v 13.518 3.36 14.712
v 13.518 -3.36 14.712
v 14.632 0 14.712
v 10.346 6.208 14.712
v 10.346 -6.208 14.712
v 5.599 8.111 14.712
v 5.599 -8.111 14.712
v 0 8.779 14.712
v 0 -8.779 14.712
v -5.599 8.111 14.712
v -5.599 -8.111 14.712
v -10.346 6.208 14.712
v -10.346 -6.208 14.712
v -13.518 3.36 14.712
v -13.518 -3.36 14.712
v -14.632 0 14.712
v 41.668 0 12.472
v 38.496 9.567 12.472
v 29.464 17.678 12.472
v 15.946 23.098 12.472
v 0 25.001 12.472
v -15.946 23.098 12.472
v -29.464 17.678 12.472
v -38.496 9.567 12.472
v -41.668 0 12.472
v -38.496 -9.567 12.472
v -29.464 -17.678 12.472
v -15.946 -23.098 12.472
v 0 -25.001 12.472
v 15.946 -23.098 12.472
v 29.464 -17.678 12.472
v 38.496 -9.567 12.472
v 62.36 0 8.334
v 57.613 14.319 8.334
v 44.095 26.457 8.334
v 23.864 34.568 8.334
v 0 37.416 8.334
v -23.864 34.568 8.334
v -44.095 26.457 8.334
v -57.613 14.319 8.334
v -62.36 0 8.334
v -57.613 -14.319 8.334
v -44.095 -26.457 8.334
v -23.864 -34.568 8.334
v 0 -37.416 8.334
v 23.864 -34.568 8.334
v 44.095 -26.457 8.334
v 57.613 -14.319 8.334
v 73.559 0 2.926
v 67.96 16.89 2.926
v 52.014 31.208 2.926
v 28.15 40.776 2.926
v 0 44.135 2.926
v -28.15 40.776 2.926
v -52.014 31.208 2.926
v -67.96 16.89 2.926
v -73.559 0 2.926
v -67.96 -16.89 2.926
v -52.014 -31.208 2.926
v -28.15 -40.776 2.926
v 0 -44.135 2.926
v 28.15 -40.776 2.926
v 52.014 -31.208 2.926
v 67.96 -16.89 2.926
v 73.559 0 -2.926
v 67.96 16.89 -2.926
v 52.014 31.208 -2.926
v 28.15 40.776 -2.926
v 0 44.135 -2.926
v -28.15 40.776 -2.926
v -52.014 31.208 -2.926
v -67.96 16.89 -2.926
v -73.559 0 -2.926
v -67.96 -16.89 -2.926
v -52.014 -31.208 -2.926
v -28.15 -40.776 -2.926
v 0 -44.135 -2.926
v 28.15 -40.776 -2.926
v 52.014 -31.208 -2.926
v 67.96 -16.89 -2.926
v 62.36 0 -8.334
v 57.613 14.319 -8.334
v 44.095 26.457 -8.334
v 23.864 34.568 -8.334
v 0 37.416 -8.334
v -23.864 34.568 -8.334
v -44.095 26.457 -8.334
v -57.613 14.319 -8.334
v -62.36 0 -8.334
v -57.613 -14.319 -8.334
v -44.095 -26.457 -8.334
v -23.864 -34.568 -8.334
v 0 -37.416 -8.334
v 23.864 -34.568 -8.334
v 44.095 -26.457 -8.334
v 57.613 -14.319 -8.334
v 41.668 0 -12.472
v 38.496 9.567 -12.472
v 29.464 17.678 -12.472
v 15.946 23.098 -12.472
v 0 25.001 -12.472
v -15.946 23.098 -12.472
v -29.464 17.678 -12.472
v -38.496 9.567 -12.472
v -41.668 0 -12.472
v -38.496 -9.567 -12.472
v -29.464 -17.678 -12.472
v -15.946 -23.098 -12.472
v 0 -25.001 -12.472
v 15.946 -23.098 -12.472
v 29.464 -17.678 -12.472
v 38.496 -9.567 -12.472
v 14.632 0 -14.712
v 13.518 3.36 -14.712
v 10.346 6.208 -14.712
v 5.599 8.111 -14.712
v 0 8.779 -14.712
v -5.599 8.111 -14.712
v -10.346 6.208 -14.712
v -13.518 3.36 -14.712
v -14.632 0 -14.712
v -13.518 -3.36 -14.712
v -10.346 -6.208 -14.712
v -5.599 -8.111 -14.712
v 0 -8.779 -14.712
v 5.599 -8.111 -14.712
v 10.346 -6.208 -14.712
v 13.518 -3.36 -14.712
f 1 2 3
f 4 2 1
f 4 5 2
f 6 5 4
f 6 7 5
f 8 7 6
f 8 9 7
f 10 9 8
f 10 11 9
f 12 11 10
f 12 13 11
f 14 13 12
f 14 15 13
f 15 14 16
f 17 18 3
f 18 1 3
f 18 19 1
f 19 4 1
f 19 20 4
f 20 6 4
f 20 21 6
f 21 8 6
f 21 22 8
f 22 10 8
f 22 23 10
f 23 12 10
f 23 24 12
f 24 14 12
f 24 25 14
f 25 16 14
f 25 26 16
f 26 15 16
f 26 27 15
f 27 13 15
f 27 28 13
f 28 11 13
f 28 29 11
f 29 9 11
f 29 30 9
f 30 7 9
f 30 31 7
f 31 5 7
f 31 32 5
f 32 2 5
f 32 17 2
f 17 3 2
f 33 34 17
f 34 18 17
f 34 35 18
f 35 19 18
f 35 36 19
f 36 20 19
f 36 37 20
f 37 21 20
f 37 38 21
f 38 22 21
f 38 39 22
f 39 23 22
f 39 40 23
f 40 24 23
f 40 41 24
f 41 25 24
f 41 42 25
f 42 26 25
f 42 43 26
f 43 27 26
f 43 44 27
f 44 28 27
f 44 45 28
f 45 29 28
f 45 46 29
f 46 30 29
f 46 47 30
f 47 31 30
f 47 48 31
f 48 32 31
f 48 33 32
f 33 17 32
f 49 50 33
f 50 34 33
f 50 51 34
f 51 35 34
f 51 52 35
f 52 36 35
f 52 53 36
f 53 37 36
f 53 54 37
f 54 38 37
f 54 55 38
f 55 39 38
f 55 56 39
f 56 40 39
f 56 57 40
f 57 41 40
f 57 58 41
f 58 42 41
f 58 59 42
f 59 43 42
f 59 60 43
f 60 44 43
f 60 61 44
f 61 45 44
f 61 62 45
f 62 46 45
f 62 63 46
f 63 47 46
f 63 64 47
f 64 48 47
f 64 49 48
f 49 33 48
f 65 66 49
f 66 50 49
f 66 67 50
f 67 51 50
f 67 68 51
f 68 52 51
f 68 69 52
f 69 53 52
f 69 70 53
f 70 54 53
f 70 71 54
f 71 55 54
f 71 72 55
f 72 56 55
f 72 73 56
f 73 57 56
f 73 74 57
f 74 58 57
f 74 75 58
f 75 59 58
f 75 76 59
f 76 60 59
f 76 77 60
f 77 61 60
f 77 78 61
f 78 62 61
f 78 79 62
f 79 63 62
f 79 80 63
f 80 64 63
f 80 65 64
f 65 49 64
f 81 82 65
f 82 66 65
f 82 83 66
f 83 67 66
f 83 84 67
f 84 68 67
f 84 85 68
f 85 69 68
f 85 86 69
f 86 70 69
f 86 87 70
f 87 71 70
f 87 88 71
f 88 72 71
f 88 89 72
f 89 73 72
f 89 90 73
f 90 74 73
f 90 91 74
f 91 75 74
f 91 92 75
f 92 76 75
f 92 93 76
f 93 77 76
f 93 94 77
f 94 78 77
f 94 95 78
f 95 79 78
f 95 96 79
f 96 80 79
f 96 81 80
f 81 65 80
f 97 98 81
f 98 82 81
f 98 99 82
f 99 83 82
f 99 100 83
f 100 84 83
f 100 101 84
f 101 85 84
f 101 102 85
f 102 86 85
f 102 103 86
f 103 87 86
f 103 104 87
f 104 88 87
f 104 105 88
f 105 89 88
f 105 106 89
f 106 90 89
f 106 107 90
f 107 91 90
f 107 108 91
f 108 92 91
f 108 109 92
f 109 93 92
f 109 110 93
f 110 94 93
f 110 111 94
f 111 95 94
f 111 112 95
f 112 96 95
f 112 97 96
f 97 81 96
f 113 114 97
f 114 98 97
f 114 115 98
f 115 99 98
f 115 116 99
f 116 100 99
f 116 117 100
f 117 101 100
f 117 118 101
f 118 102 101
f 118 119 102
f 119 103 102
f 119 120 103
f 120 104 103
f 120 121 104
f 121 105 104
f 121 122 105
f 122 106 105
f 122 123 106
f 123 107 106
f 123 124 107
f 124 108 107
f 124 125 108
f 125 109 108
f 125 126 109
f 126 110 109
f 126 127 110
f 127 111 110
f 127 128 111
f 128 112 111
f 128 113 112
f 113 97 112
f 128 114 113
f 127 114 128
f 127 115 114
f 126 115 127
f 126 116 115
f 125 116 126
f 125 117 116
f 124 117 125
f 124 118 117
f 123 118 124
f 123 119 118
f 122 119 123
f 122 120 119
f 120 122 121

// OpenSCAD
// Generated by SolidPython 1.0.1 on 2020-07-29 00:46:51


scale(v = [15, 9, 3]) {
	sphere(r = 5);
}
/***********************************************
*********      SolidPython code:      **********
************************************************
 
# import packages: SolidPython
from solid import *
from solid.utils import *
from itertools import chain, combinations, permutations


class Resize:

    def __init__(self, scad_file):
        self.scad_file = scad_file
        #self.scad_file = import_scad(scad_file)
        # cone/cylinder param:
        self.r1 = 0
        self.r2 = 0
        self.h = 0
        # rectangular prism param:
        self.w = 0
        self.l = 0
        # ellipse param:
        self.r = 0

    # import OpenScad code (file name corresponds to shape)


    # classify shape + parameters
    def assign(self, param1, param2, param3):
        if self.scad_file == 'cone.scad':
            self.r1 = param1
            self.r2 = param2
            self.h = param3
        elif self.scad_file == 'cylinder.scad':
            self.r1 = param1
            self.r2 = param2
            self.h = param3
        elif self.scad_file == 'rectangularPrism.scad':
            self.h = param1
            self.l = param2
            self.w = param3
        else:
            self.r = param1
            self.h = param2

    # resize parameters
    def iterate(self):
        x = range(3, 20, 2)
        i = 1
        if self.scad_file == 'cone.scad':
            tempList = list(permutations(x, 2))
            for temp in tempList:
                param1 = temp[0]
                param2 = temp[1]
                filepath = 'produced_scad_files/' + 'cone' + str(param1) + '_' + str(param2) + '_' + '.scad'
                scad_render_to_file(cylinder(h=param1, r1=param2, r2=0), filepath)

        elif self.scad_file == 'cylinder.scad':
            tempList = list(permutations(x, 3))
            for temp in tempList:
                param1 = temp[0]
                param2 = temp[1]
                filepath = 'produced_scad_files/' + 'cylinder' + str(param1) + '_' + str(param2) + '_' + '.scad'
                scad_render_to_file(cylinder(h=param1, r1=param2, r2=param2), filepath)

        elif self.scad_file == 'rectangularPrism.scad':
            tempList = list(permutations(x, 3))
            for temp in tempList:
                param1 = temp[0]
                param2 = temp[1]
                param3 = temp[2]
                filepath = 'produced_scad_files/' + 'rectangularPrism' + str(param1) + '_' + str(param2) + '_' + str(
                    param3) + '.scad'
                scad_render_to_file(cube(size=(param1, param2, param3)), filepath)

        elif self.scad_file == 'ellipse.scad':
            tempList = list(permutations(x, 4))
            for temp in tempList:
                param1 = temp[0]
                param2 = temp[1]
                param3 = temp[2]
                param4 = temp[3]
                filepath = 'produced_scad_files/' + 'ellipse' + str(param1) + '_' + str(param2) + '_' + str(param3) + '_' + str(param4) + '.scad'
                scad_render_to_file(scale([param1, param2, param3])(sphere(r=param4)), filepath)

    def render_to_scadfile(self):
        scad_render_to_file(scad, 'example.scad') 
 
************************************************/
